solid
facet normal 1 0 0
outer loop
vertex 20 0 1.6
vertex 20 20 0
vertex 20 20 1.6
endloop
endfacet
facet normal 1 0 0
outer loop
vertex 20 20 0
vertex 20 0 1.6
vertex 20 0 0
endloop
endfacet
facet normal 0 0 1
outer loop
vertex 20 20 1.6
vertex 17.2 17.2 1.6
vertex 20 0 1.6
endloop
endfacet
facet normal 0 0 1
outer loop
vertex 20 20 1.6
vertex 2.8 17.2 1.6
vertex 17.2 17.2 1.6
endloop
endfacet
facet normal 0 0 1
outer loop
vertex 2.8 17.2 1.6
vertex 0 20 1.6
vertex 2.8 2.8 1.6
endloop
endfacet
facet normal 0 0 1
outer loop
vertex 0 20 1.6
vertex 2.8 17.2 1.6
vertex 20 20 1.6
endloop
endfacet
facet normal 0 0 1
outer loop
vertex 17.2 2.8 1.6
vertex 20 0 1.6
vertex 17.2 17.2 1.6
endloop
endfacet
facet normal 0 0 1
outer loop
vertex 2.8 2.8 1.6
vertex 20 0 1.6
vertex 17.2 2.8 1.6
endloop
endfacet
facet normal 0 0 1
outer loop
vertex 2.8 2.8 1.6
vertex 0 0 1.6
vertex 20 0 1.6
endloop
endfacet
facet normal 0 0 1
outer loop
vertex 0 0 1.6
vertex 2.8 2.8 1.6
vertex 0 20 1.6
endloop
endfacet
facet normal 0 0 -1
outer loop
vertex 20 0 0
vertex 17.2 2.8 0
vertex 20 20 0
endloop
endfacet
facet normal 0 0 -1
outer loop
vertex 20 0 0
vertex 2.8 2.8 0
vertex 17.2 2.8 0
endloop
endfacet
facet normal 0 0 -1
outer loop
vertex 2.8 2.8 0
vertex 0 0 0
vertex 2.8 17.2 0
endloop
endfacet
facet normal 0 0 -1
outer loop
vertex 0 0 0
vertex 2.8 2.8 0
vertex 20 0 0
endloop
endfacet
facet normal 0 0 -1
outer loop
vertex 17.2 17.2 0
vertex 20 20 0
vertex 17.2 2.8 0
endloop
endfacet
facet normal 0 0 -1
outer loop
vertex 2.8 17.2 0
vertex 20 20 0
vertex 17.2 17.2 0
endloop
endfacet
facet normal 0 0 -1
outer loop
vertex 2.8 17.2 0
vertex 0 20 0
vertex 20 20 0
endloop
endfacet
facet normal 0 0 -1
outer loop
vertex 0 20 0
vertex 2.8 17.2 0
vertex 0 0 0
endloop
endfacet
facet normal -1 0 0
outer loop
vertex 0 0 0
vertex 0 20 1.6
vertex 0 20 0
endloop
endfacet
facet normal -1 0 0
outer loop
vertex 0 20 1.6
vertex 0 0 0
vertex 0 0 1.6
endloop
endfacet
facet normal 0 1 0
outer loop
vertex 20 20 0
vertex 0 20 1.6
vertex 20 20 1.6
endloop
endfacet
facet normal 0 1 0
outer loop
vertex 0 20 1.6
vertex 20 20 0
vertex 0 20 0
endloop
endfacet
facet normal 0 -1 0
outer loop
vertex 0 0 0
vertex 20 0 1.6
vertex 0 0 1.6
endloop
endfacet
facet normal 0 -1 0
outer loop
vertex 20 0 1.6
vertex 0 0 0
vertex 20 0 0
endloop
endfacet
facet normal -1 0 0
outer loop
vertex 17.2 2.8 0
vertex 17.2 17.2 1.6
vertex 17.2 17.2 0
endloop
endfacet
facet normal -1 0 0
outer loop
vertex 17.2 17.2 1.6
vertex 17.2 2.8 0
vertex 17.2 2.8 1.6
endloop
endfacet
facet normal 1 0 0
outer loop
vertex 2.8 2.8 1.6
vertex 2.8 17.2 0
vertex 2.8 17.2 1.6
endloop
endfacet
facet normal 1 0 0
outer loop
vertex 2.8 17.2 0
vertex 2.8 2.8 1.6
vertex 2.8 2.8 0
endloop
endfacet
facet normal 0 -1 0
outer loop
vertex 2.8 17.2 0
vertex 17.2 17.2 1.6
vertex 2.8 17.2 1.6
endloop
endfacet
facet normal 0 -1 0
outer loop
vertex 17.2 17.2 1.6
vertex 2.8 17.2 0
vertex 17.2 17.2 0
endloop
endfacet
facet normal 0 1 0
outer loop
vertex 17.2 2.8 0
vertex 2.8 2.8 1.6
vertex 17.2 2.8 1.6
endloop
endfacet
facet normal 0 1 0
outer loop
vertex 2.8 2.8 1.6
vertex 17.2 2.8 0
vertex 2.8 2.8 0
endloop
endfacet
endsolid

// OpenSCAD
module switchHole(holeSize, height)
{
    translate(-[holeSize[0], holeSize[1], 0] / 2)
    cube(holeSize[0], holeSize[1], height);
}

PADDING = 0.2;
SWITCH_SIZE = [14,14];
HOLE_SIZE = SWITCH_SIZE + [PADDING * 2, PADDING * 2];

PLATE_HEIGHT = 1.6;

difference()
{
    cube([20,20,PLATE_HEIGHT]);
    translate([20/2,20/2,-1])
    switchHole(HOLE_SIZE, 2 + 2);
}
